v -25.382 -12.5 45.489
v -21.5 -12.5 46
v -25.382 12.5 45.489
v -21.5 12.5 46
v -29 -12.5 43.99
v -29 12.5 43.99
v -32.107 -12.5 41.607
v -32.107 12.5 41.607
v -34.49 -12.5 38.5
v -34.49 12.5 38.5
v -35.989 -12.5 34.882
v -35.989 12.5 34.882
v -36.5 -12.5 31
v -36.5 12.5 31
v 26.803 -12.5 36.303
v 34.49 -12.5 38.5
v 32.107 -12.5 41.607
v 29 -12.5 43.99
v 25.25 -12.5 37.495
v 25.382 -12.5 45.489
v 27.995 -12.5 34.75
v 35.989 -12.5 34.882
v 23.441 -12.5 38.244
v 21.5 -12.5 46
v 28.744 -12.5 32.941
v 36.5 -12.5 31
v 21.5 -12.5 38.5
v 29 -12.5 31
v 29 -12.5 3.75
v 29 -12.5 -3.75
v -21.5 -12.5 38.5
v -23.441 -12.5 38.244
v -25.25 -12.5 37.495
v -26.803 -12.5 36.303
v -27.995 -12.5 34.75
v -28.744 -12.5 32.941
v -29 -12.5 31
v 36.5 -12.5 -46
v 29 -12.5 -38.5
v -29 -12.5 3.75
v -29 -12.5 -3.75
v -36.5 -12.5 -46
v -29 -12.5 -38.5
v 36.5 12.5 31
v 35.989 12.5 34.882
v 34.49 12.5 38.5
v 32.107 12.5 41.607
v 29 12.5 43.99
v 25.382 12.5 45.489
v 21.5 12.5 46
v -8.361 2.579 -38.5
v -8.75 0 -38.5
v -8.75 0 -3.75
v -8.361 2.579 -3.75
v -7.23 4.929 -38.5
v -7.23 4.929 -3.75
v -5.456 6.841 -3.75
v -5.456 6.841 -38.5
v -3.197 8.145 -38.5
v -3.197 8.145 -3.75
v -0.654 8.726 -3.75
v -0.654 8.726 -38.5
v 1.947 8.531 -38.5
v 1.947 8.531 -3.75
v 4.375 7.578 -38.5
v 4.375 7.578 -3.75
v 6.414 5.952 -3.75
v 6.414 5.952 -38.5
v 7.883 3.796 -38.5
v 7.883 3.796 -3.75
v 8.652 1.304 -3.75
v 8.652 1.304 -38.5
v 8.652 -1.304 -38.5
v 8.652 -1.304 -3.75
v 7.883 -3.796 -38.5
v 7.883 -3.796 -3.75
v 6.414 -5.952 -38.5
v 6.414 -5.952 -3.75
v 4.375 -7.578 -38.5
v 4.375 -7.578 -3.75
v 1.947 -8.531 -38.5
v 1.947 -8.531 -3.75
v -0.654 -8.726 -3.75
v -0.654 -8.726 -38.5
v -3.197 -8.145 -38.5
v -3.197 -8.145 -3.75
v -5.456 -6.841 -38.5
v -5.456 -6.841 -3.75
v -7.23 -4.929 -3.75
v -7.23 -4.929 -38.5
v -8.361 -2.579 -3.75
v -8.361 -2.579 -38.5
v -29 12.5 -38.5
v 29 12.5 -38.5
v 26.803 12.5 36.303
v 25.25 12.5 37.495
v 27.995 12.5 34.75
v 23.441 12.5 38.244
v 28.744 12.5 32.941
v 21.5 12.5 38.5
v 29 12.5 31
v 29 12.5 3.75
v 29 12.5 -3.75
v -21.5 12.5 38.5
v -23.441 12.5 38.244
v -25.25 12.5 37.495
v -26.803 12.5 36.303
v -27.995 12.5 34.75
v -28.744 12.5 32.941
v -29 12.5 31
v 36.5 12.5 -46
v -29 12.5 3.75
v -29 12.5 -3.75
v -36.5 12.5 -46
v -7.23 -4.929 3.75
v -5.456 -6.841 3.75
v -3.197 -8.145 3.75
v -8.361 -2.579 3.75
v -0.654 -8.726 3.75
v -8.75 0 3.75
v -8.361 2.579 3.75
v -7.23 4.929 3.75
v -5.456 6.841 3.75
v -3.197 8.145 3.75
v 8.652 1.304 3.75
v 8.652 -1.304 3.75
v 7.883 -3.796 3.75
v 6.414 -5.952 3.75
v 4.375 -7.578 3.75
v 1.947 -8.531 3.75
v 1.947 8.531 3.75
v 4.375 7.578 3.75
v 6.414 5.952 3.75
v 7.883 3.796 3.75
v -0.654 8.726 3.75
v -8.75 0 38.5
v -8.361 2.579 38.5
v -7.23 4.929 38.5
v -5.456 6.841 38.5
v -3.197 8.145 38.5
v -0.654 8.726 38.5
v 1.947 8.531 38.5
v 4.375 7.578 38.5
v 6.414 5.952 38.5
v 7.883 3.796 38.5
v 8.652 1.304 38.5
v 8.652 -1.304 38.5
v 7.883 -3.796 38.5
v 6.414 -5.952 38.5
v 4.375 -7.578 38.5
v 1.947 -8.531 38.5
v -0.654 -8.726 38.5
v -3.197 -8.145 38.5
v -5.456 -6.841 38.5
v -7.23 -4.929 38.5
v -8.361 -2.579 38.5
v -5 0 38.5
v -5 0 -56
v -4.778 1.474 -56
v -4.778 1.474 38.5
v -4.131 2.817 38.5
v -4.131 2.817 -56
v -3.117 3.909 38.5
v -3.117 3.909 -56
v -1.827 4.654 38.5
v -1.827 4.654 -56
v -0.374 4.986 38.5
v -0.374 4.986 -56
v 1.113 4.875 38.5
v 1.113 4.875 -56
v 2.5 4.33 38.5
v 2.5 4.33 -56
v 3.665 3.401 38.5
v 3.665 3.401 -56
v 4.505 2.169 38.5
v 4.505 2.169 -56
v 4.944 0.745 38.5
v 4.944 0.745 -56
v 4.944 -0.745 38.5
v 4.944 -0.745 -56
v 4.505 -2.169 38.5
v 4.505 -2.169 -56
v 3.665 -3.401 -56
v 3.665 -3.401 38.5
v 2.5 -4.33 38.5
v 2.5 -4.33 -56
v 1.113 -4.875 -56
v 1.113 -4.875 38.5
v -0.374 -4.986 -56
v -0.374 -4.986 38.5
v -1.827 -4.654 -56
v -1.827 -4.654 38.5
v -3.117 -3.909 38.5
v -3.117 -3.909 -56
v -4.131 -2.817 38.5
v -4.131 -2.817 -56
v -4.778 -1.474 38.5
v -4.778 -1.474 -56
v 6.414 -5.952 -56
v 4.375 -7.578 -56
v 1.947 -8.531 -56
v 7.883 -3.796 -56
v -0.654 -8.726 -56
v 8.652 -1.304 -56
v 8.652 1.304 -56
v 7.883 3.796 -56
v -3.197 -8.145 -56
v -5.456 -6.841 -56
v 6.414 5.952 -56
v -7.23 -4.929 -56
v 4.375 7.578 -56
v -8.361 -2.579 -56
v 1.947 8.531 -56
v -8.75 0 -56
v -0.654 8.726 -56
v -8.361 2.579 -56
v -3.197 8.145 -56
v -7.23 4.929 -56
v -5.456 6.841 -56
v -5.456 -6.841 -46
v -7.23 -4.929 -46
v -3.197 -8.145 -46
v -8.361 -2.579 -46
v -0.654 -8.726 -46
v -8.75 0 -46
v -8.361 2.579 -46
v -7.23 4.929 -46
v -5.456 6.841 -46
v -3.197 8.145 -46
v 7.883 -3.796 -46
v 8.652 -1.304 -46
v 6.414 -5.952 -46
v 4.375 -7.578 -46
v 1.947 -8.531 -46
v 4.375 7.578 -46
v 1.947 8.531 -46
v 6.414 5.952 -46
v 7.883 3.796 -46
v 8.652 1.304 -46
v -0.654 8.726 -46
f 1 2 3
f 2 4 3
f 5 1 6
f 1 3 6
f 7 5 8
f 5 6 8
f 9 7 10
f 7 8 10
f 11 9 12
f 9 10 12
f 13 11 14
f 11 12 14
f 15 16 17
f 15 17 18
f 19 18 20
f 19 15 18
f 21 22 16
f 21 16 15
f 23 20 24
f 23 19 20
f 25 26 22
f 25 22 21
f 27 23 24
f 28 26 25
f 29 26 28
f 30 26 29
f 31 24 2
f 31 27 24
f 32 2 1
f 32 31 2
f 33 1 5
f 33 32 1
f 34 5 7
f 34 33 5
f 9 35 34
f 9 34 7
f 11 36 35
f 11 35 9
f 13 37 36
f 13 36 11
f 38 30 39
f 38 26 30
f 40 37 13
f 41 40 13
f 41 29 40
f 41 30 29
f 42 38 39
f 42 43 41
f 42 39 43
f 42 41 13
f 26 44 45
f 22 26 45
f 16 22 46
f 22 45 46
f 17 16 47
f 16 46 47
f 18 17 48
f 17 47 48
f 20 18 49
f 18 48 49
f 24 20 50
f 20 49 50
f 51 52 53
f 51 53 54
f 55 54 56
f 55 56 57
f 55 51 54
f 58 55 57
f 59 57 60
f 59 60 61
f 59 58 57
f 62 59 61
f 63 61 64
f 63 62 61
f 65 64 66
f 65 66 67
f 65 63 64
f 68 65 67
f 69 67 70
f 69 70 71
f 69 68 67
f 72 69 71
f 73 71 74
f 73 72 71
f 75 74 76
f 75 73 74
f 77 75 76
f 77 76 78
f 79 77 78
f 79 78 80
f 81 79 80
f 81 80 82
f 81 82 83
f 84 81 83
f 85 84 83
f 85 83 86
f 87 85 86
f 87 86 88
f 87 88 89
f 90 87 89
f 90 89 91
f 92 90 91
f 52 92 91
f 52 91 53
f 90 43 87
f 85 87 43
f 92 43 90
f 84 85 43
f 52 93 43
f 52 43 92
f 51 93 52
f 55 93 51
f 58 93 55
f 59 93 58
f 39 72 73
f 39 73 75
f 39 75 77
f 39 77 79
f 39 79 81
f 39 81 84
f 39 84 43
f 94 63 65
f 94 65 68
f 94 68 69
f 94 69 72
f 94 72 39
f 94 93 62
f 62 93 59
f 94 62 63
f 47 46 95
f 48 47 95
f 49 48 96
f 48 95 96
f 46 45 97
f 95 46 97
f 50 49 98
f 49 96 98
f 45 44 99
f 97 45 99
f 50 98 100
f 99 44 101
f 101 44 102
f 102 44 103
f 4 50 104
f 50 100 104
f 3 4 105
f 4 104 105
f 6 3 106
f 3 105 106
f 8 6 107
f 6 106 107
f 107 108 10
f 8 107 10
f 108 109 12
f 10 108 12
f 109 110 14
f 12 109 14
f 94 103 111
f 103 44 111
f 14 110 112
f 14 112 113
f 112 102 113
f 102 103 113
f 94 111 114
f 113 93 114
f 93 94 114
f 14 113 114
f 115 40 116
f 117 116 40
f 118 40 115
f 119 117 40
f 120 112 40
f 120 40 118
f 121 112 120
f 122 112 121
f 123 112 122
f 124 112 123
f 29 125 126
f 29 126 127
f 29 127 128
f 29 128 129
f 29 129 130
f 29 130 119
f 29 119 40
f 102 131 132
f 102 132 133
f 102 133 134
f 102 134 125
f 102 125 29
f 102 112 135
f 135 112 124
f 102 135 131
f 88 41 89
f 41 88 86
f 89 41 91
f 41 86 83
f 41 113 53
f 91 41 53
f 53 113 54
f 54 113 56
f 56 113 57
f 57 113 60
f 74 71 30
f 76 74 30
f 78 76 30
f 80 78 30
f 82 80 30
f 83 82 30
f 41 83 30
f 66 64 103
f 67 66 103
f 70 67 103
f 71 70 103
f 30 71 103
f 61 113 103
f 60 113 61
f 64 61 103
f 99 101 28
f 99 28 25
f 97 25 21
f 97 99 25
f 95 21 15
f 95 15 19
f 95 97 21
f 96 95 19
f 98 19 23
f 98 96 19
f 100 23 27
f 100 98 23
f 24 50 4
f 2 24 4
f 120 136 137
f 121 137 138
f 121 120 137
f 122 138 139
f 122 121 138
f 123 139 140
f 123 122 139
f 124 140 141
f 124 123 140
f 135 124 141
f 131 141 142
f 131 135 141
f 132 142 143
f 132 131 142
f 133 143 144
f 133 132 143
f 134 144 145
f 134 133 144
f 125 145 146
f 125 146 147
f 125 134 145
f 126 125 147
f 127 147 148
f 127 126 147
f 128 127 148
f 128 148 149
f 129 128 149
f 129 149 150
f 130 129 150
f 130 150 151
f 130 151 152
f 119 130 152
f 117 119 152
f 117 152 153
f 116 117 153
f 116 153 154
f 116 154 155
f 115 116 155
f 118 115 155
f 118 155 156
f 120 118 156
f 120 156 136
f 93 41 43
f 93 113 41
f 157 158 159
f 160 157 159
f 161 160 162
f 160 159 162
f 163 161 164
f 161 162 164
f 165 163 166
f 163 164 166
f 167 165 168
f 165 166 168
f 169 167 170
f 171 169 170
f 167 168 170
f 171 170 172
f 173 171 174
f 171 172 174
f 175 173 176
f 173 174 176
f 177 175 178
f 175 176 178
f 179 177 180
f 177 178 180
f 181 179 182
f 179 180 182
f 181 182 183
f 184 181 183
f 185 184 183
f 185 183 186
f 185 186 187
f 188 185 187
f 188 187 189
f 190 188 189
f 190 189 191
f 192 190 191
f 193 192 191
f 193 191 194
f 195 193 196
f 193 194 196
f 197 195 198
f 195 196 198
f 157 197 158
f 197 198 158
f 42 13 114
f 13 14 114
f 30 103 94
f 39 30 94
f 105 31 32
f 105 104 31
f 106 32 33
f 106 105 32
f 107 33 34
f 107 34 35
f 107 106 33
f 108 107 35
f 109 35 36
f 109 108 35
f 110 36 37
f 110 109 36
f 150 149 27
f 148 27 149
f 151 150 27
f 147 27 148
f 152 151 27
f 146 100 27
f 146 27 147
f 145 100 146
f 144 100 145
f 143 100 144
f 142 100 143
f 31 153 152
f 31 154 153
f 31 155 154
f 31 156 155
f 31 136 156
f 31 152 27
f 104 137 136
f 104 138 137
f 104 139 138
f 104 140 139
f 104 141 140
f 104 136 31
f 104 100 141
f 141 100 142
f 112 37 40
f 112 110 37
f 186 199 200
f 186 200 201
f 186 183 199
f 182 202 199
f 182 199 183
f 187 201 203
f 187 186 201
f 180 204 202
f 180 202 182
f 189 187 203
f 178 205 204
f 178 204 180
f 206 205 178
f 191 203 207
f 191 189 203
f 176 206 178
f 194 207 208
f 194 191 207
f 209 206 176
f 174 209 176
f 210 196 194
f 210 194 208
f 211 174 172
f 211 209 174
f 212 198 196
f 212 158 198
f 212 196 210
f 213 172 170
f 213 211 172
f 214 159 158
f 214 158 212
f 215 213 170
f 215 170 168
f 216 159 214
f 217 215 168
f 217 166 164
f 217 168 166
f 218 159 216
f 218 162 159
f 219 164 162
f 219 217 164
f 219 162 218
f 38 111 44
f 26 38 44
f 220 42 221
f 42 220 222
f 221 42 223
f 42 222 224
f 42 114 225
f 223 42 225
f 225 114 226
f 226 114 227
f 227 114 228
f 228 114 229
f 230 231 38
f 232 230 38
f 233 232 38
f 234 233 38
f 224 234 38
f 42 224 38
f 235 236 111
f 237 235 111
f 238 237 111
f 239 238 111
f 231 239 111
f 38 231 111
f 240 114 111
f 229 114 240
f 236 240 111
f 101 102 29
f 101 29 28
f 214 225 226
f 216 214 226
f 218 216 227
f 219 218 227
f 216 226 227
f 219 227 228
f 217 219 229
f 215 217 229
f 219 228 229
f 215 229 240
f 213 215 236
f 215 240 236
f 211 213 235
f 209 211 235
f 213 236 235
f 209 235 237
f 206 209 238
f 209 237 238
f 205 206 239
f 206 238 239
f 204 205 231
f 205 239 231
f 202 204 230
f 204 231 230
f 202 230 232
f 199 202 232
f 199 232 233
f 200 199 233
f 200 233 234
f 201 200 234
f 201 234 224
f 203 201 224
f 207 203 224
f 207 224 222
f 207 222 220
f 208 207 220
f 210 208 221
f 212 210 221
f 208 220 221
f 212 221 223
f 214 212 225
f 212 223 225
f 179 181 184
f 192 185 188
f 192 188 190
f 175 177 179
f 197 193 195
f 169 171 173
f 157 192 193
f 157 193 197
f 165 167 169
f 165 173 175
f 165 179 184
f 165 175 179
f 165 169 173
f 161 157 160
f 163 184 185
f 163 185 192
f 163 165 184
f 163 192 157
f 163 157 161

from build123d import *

# Parameters (mm, degrees)
CROQUIS1_W                   = 58
CROQUIS1_H                   = 34.75
SALIENTE_EXTRUIR1_DEPTH      = 12.5
CROQUIS2_R                   = 8.75
SALIENTE_EXTRUIR2_DEPTH      = 10
SALIENTE_EXTRUIR2_DEPTH_BACK = 84.5
CROQUIS3_R                   = 5
CORTAR_EXTRUIR1_DEPTH        = 94.5


with BuildPart() as part:
    # Croquis1 → Saliente-Extruir1 (new body, symmetric)
    with BuildSketch(Plane(origin=(0, 0, 0), x_dir=(1, 0, 0), z_dir=(0, 1, 0))):
        with BuildLine():
            Line((21.5, -46), (-21.5, -46))
            ThreePointArc((-21.5, -46), (-32.106601718, -41.606601718), (-36.5, -31))
            Line((-36.5, -31), (-36.5, 46))
            Line((-36.5, 46), (36.5, 46))
            Line((36.5, 46), (36.5, -31))
            ThreePointArc((36.5, -31), (32.106601718, -41.606601718), (21.5, -46))
        make_face()
        with BuildLine():
            Line((-29, -31), (-29, -3.75))
            Line((-29, -3.75), (29, -3.75))
            Line((29, -3.75), (29, -31))
            ThreePointArc((29, -31), (26.803300859, -36.303300859), (21.5, -38.5))
            Line((21.5, -38.5), (-21.5, -38.5))
            ThreePointArc((-21.5, -38.5), (-26.803300859, -36.303300859), (-29, -31))
        make_face(mode=Mode.SUBTRACT)
        with Locations((0, 21.125)):
            Rectangle(CROQUIS1_W, CROQUIS1_H, mode=Mode.SUBTRACT)
    extrude(amount=SALIENTE_EXTRUIR1_DEPTH, both=True)

    # Croquis2 → Saliente-Extruir2 (add, two sides)
    with BuildSketch(Plane(origin=(0, 0, -46), x_dir=(-1, 0, 0), z_dir=(0, 0, -1))) as saliente_extruir2_sk:
        Circle(CROQUIS2_R)
    extrude(amount=SALIENTE_EXTRUIR2_DEPTH)
    extrude(saliente_extruir2_sk.sketch, amount=-SALIENTE_EXTRUIR2_DEPTH_BACK)

    # Croquis3 → Cortar-Extruir1 (cut)
    with BuildSketch(Plane(origin=(0, 0, -56), x_dir=(-1, 0, 0), z_dir=(0, 0, -1))):
        Circle(CROQUIS3_R)
    extrude(amount=-CORTAR_EXTRUIR1_DEPTH, mode=Mode.SUBTRACT)


solid = part.part
